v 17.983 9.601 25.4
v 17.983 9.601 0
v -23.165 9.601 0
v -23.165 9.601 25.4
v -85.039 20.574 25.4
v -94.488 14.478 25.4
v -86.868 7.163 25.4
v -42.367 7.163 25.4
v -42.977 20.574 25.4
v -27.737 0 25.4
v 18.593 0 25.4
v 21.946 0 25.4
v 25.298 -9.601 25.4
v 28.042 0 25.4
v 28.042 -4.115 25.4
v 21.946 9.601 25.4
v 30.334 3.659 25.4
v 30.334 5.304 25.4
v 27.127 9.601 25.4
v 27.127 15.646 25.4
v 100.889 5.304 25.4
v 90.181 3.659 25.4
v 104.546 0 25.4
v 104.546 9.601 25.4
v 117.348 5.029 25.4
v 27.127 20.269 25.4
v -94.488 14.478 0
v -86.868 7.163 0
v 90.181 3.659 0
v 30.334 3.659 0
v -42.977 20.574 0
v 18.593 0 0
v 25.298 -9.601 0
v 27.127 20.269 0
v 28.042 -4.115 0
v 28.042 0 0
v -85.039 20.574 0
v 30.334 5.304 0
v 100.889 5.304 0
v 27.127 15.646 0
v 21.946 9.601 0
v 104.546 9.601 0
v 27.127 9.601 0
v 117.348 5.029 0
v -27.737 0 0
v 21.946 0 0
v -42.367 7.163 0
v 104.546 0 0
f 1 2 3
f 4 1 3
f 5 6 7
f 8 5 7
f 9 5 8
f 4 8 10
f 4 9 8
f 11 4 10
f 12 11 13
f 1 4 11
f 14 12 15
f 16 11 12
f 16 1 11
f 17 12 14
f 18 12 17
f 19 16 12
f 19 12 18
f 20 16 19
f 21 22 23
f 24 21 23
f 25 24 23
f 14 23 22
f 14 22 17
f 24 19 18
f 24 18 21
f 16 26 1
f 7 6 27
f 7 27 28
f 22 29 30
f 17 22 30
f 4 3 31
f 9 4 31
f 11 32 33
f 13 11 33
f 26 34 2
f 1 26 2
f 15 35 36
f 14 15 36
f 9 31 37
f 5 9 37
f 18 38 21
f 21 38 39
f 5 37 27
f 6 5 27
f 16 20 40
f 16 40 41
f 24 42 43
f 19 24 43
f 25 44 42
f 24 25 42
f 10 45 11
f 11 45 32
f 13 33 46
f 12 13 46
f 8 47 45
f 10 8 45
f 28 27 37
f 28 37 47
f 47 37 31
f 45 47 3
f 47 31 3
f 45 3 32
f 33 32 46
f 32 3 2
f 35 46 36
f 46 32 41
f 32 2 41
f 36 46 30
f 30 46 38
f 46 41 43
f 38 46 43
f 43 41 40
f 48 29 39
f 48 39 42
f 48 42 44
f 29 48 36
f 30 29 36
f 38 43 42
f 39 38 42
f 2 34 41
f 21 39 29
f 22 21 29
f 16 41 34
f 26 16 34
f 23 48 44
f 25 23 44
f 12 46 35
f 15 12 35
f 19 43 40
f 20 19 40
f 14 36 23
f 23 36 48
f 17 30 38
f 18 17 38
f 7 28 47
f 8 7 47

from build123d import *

# Parameters (mm, degrees)
F1_DEPTH = 25.4


with BuildPart() as f1:
    # F0 (on Top) → F1 (new body)
    with BuildSketch(Plane.XY):
        Polygon((9.144, 9.6012), (4.267201, 9.6012), (-23.164801, 9.6012), (-42.9768, 20.574002), (-85.039198, 20.574002), (-94.487995, 14.478001), (-86.868003, 7.1628), (-42.367201, 7.1628), (-27.7368, 0), (-12.192, 0), (18.592801, 0), (25.2984, -9.6012), (21.945599, 0), (28.041599, -4.1148), (28.041599, 0), (32.003999, 0), (41.148003, 0), (60.655203, 0), (85.344002, 0), (104.546405, 0), (100.888811, 5.304316), (104.546405, 9.6012), (85.344002, 9.6012), (60.655203, 9.6012), (40.843204, 9.6012), (32.308798, 9.6012), (27.127199, 9.6012), (27.127199, 15.646401), (21.945599, 9.6012), (27.127199, 20.2692), (17.983202, 9.6012), align=None)
        Polygon((90.180784, 5.304316), (100.888811, 5.304316), (90.180784, 3.65947), (30.333724, 3.65947), (30.333724, 5.304316), align=None, mode=Mode.SUBTRACT)
        Polygon((117.348, 5.0292), (104.546405, 9.6012), (100.888811, 5.304316), (104.546405, 0), align=None)
    extrude(amount=F1_DEPTH)


solid = f1.part
